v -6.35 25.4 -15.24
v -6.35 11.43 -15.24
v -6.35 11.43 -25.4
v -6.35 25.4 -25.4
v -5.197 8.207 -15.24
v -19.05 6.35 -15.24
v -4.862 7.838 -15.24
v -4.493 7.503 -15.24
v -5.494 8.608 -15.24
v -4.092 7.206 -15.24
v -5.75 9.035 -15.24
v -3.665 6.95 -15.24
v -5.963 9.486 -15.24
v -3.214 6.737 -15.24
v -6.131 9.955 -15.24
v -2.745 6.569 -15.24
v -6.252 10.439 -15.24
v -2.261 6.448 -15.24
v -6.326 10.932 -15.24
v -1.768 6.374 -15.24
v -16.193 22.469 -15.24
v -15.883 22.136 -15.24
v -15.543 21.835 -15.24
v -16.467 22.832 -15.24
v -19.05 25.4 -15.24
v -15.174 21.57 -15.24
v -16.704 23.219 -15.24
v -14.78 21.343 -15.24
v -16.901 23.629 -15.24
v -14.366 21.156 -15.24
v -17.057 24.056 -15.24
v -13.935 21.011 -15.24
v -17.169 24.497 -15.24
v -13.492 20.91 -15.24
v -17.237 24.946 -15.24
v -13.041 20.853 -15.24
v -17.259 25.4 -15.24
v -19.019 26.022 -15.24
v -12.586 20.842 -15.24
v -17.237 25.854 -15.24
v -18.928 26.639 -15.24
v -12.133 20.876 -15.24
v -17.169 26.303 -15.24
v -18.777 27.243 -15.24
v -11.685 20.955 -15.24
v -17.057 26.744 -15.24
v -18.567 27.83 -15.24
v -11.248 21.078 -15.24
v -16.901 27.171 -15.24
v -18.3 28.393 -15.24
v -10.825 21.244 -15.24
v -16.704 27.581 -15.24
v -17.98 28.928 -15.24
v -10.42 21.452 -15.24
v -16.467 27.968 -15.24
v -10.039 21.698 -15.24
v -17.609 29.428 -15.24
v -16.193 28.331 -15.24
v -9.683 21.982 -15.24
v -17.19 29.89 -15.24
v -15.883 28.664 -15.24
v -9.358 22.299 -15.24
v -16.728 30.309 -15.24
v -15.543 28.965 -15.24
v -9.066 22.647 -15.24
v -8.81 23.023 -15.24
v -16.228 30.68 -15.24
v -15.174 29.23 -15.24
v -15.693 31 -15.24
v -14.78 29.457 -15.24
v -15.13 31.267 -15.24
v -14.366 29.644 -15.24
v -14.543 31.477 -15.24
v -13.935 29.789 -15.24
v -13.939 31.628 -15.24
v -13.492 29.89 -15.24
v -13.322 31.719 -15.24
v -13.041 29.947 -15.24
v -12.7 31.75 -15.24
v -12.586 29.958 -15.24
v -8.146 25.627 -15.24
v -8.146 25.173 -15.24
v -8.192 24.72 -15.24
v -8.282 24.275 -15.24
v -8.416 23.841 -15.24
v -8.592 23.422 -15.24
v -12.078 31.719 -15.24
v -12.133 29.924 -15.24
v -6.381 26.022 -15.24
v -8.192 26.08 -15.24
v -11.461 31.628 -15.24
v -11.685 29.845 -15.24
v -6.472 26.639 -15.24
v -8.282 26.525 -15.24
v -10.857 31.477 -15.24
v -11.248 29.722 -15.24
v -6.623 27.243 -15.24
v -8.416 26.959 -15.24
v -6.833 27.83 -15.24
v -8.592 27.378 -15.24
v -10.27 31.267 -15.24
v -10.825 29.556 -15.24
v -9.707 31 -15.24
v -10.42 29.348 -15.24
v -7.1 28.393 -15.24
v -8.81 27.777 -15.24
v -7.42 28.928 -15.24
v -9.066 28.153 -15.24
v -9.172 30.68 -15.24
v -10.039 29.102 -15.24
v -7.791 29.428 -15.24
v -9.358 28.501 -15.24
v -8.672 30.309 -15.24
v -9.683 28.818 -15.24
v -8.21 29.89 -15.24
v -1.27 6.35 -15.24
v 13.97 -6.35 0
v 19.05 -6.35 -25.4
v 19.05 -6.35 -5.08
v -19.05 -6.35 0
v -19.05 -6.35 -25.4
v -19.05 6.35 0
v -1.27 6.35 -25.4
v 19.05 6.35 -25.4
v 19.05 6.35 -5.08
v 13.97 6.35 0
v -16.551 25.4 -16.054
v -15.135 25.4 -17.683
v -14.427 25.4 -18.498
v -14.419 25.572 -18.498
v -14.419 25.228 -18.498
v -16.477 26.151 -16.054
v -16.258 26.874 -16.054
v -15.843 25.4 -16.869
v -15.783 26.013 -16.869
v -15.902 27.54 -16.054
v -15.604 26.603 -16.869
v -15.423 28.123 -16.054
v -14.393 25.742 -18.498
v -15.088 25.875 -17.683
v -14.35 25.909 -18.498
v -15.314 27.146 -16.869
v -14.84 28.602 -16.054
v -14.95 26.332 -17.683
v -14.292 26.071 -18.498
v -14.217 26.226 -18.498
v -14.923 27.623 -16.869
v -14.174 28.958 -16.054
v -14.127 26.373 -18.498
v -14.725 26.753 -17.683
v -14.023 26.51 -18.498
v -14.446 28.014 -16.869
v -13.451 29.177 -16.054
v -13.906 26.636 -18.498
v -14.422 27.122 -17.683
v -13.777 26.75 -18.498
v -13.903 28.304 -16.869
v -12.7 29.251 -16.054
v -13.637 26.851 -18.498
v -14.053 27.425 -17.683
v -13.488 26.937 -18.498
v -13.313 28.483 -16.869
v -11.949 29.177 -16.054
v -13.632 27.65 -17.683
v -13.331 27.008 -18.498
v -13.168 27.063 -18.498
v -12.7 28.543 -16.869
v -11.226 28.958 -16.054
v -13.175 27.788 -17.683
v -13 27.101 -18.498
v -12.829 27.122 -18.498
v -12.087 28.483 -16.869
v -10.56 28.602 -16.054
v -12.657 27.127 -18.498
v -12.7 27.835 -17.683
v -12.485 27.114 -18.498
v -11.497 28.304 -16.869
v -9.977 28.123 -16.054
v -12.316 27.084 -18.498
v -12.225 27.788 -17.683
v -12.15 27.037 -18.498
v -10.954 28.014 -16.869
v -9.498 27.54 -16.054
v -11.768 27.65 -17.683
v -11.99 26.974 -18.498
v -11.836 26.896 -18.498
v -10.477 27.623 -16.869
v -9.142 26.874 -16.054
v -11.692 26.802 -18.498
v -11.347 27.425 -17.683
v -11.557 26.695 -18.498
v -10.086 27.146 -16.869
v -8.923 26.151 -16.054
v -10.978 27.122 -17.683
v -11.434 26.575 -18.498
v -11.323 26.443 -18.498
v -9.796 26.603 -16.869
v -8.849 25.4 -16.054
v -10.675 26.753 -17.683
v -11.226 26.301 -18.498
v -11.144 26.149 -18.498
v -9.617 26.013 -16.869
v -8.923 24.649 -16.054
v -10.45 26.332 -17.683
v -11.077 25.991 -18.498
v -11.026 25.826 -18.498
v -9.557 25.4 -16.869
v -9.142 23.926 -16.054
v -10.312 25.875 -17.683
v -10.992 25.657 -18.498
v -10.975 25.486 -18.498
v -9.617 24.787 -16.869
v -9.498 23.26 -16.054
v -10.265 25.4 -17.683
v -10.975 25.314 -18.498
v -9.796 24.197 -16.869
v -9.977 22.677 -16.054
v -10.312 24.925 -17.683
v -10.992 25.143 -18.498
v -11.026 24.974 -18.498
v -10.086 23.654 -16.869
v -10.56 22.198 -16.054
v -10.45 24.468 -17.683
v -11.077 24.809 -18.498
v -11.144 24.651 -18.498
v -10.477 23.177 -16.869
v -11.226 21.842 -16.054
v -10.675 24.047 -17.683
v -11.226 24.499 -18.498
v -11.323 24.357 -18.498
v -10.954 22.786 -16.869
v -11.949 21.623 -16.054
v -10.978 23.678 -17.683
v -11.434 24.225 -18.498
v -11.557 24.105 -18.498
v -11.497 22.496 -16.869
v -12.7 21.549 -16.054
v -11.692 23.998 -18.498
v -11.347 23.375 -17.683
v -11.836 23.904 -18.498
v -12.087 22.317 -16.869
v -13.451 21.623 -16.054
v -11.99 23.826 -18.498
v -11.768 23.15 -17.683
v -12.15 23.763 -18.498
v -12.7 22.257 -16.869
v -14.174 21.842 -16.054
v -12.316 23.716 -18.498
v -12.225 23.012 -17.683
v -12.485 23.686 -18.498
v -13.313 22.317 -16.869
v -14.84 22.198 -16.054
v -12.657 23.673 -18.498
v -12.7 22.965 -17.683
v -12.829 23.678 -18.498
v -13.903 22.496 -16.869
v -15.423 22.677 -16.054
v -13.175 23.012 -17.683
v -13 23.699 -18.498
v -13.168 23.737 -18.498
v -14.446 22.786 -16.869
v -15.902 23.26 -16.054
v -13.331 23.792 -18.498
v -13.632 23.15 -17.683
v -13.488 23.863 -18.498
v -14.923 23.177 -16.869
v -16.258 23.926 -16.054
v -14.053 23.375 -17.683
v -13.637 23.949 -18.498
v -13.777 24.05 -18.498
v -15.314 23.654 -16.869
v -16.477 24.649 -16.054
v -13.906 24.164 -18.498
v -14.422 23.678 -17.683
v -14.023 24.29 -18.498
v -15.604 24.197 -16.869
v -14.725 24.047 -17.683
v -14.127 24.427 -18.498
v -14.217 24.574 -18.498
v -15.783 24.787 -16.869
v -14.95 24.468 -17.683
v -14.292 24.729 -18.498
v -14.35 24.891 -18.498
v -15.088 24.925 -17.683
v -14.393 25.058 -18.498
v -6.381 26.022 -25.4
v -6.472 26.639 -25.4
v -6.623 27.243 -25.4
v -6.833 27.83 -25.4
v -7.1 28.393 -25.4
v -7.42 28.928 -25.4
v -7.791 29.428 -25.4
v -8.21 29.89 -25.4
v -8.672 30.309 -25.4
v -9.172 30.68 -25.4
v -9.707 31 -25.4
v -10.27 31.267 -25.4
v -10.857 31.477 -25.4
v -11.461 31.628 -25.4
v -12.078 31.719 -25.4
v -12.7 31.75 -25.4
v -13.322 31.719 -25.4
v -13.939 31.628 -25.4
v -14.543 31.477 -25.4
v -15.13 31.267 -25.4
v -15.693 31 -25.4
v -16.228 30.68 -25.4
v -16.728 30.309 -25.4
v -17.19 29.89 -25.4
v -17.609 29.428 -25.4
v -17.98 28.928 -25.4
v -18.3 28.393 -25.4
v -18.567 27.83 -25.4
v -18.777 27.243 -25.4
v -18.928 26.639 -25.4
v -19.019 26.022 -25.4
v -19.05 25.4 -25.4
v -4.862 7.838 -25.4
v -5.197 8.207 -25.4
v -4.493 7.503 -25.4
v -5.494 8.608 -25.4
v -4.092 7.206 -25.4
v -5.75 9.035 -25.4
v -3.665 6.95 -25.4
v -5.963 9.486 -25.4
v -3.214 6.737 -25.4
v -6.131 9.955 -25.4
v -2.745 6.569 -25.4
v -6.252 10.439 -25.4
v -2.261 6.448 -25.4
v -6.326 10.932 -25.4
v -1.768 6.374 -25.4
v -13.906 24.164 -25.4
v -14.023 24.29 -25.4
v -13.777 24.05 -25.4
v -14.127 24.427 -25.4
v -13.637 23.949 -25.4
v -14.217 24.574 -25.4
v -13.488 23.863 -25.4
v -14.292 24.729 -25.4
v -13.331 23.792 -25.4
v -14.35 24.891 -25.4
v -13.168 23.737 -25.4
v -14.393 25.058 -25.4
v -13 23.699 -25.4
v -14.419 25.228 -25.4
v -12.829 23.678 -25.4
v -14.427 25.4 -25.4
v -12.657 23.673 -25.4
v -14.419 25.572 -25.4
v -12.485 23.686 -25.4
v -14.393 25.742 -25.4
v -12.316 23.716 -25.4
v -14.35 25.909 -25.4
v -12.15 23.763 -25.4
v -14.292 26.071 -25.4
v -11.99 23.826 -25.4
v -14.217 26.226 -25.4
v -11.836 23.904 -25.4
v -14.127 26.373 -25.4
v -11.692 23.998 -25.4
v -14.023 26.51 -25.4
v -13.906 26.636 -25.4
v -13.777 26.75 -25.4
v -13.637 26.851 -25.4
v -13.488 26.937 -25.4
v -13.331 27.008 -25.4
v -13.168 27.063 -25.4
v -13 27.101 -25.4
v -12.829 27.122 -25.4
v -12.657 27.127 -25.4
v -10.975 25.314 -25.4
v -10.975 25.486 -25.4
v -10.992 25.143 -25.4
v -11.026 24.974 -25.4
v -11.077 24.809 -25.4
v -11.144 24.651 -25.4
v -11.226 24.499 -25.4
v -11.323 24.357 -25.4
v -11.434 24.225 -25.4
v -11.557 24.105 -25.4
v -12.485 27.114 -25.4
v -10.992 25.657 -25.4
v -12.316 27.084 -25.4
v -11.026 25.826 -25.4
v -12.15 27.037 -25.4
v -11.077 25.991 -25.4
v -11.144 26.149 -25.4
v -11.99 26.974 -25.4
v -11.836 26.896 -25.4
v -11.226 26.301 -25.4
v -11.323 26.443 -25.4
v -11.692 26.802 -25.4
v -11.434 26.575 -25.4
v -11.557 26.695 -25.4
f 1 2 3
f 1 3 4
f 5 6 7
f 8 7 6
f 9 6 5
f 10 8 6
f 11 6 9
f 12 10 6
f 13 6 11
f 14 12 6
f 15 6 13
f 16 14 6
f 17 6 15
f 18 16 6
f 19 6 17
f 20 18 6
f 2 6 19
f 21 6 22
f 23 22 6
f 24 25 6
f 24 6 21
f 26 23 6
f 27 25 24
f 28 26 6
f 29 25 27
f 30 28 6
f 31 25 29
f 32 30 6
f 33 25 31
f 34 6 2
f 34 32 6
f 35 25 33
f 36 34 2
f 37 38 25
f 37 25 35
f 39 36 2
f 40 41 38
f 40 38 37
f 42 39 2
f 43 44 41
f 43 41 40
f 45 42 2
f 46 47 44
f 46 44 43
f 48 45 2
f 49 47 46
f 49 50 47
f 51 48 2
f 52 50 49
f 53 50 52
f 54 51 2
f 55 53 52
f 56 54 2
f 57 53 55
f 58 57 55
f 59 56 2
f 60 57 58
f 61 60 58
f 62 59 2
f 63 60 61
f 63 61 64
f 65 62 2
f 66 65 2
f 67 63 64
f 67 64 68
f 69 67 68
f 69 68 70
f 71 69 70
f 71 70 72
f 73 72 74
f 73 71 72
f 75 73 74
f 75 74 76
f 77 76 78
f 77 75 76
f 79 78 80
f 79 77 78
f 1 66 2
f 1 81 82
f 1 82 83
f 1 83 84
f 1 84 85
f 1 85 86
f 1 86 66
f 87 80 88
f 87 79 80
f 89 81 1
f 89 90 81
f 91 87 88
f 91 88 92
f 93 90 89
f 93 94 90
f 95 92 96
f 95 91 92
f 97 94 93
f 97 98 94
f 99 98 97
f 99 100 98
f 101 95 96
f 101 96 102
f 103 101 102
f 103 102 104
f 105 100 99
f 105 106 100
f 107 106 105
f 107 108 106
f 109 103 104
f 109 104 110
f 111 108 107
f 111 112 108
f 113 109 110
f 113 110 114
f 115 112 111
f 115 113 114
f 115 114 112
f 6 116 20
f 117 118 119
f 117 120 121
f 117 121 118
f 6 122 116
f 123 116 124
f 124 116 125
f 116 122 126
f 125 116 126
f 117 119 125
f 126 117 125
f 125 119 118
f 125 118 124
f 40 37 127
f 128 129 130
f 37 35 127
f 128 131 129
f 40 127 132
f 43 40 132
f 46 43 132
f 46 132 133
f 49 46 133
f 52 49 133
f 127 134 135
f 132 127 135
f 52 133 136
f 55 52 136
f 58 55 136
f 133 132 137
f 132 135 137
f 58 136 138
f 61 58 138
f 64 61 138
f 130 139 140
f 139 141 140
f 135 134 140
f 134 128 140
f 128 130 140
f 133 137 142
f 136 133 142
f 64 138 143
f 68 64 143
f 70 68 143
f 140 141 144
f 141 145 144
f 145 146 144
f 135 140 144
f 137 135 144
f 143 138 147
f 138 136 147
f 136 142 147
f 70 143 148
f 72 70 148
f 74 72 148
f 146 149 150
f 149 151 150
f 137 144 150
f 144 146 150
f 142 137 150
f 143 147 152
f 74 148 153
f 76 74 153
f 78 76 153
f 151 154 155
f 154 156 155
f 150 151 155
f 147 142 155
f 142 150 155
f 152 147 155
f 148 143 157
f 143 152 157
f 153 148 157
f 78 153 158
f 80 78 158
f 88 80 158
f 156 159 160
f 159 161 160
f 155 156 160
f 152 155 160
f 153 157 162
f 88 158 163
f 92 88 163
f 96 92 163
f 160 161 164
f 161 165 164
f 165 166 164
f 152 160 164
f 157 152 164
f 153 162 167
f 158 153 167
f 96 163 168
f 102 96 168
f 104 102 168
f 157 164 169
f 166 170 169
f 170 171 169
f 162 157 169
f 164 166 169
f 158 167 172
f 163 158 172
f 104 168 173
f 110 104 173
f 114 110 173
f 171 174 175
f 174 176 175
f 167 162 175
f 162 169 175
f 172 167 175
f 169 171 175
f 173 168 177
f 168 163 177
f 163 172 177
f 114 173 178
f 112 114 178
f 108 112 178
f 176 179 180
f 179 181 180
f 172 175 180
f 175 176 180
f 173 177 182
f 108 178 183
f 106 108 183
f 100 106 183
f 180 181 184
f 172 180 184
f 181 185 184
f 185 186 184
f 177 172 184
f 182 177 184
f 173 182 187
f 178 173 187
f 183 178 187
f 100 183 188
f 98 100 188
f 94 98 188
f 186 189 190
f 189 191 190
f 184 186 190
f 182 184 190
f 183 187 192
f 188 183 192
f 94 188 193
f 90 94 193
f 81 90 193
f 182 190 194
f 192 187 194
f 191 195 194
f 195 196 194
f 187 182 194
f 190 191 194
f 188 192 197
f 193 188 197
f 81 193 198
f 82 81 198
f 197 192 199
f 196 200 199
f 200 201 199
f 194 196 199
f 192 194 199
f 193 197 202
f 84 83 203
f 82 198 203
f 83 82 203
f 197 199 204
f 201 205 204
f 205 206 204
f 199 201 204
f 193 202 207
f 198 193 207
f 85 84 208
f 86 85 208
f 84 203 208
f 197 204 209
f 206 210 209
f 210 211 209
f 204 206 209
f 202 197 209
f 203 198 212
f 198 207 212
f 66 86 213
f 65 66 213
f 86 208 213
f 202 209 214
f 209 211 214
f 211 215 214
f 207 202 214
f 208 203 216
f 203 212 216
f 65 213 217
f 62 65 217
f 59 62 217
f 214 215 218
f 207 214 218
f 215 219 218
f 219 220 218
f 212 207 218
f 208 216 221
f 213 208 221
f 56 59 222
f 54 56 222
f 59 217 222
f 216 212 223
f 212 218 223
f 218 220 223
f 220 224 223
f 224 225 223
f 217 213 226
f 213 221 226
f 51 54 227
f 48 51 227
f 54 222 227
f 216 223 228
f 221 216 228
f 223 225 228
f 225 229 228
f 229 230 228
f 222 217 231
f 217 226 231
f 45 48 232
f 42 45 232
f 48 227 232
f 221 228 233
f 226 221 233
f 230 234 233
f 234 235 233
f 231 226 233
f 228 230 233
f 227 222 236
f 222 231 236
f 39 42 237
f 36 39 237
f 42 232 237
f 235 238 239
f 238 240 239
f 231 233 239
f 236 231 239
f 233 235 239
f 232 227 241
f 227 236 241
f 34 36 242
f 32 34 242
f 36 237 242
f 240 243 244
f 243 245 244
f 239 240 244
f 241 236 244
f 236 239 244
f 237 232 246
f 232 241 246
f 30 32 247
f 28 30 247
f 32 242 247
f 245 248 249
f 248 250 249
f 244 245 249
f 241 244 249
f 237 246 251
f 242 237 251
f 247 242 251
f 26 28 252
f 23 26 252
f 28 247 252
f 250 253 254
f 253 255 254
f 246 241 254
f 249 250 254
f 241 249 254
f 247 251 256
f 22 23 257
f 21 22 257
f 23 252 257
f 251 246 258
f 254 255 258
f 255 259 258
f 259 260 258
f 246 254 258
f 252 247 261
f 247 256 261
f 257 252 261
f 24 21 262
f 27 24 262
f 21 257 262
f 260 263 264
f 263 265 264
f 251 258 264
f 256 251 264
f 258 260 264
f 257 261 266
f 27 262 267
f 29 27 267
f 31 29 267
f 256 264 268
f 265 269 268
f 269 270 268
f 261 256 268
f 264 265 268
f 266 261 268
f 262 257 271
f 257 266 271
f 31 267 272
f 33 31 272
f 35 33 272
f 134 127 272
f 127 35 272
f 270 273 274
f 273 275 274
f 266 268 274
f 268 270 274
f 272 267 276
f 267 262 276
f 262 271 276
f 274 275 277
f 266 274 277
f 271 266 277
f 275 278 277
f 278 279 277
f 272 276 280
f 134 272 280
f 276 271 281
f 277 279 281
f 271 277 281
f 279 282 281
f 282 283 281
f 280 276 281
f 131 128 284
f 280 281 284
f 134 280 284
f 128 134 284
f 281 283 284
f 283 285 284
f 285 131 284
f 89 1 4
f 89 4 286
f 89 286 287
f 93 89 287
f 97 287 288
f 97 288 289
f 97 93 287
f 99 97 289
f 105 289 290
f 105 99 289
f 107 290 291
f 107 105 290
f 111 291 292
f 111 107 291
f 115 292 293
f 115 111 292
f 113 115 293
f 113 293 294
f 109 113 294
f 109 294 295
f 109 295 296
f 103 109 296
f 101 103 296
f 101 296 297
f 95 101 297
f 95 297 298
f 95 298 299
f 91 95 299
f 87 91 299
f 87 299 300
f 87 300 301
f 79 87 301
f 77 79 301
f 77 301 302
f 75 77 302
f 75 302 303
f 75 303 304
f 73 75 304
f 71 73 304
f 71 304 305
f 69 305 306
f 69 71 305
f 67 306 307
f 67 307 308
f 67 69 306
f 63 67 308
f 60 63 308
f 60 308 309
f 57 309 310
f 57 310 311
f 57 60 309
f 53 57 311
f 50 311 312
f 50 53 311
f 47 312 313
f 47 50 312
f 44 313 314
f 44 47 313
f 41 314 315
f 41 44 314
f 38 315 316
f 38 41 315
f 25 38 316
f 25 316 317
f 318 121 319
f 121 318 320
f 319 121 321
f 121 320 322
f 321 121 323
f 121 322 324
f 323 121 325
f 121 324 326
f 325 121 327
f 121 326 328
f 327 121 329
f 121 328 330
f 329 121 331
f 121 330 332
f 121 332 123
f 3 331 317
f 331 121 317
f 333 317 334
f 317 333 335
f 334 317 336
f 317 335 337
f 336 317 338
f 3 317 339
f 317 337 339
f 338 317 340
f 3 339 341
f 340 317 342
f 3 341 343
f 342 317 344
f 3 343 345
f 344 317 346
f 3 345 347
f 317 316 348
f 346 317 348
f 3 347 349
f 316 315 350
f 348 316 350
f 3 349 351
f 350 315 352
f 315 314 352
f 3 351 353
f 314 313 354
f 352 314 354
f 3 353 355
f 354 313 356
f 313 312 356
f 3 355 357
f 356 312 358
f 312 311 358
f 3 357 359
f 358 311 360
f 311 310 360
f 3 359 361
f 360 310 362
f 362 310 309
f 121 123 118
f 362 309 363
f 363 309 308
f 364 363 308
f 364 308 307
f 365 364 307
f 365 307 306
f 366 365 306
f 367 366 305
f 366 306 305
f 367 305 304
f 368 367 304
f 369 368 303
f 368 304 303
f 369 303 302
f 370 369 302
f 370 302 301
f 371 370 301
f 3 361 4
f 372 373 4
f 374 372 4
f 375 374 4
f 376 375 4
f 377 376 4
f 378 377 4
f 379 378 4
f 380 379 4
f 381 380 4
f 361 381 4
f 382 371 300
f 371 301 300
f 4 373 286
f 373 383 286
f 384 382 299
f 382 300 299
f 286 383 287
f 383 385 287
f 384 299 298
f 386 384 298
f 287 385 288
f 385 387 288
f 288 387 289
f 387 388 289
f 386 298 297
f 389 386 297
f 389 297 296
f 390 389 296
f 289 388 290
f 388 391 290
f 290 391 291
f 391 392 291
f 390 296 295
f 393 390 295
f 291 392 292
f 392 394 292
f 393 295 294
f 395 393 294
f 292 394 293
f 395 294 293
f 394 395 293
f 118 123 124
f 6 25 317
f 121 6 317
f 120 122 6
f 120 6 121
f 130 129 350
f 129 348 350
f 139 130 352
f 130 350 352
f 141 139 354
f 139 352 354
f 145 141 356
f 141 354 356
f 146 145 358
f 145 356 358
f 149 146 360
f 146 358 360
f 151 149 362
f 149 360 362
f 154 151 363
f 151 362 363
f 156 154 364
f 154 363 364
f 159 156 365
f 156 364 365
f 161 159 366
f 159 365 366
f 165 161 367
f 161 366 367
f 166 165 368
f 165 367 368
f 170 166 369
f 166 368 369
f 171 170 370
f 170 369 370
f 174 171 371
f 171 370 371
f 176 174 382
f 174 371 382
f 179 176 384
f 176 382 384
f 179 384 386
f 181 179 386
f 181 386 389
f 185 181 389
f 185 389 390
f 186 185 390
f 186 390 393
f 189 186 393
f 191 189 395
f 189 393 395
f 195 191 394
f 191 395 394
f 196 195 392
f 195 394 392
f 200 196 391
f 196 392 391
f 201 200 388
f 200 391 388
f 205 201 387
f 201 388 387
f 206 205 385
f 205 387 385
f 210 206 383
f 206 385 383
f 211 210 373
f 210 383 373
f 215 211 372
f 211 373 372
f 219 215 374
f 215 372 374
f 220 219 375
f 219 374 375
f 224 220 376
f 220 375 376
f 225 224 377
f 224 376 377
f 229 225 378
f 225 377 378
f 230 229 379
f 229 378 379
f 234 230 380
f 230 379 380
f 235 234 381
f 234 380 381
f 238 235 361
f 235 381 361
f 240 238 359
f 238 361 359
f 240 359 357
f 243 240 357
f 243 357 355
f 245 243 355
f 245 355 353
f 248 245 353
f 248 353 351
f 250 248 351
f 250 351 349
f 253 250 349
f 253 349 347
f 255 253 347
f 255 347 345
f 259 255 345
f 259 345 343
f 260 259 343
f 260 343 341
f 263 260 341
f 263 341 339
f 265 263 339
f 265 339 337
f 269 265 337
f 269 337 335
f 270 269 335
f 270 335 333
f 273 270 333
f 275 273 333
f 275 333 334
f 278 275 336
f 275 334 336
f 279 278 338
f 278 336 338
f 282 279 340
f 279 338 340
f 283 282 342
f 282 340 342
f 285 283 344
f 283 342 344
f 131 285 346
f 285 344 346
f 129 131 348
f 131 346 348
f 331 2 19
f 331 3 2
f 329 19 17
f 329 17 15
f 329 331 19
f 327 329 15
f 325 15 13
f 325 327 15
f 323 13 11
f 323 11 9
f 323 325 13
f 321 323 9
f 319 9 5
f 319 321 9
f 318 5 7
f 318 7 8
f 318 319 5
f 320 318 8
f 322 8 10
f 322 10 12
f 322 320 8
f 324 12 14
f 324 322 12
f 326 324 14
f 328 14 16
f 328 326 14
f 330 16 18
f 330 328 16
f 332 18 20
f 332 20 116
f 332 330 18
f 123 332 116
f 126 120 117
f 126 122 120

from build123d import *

# Parameters (mm, degrees)
F0_W           = 12.7
F0_H           = 19.05
F1_DEPTH       = 25.4
F2_DEPTH       = 15.24
F3_D           = 3.4544
F3_START       = 15.24
F3_CSINK_D     = 9.1186
F3_CSINK_ANGLE = 82
F4_R           = 5.08
F5_SIZE        = 5.08


with BuildPart() as f1:
    # F0 (on Top) → F1 (new body)
    with BuildSketch(Plane.XY):
        Polygon((-19.05, 6.35), (-19.05, -6.35), (19.05, -6.35), (19.05, 6.35), (-6.35, 6.35), align=None)
        with Locations((-12.7, 15.875)):
            Rectangle(F0_W, F0_H)
        with BuildLine():
            ThreePointArc((-6.35, 25.4), (-12.7, 31.75), (-19.05, 25.4))
            Line((-19.05, 25.4), (-6.35, 25.4))
        make_face()
    extrude(amount=-F1_DEPTH)

    # F0 (on Top) → F2 (cut)
    with BuildSketch(Plane.XY):
        with Locations((-12.7, 15.875)):
            Rectangle(F0_W, F0_H)
        with BuildLine():
            ThreePointArc((-6.35, 25.4), (-12.7, 31.75), (-19.05, 25.4))
            Line((-19.05, 25.4), (-6.35, 25.4))
        make_face()
    extrude(amount=-F2_DEPTH, mode=Mode.SUBTRACT)

    # F3 (through all)
    # its depths count from where the whole tool has entered the part; down to there all is cleared
    with Locations(Plane.XY.offset(-F3_START)):
        with Locations((-12.7, 25.4)):
            CounterSinkHole(F3_D / 2, F3_CSINK_D / 2, counter_sink_angle=F3_CSINK_ANGLE)

    # F4
    f4_edges = [f1.edges().sort_by_distance(p)[0] for p in [
        (-6.35, 6.35, -20.32),
    ]]
    fillet(f4_edges, radius=F4_R)

    # F5
    f5_edges = [f1.edges().sort_by_distance(p)[0] for p in [
        (19.05, 0, 0),
    ]]
    chamfer(f5_edges, length=F5_SIZE)


solid = f1.part
